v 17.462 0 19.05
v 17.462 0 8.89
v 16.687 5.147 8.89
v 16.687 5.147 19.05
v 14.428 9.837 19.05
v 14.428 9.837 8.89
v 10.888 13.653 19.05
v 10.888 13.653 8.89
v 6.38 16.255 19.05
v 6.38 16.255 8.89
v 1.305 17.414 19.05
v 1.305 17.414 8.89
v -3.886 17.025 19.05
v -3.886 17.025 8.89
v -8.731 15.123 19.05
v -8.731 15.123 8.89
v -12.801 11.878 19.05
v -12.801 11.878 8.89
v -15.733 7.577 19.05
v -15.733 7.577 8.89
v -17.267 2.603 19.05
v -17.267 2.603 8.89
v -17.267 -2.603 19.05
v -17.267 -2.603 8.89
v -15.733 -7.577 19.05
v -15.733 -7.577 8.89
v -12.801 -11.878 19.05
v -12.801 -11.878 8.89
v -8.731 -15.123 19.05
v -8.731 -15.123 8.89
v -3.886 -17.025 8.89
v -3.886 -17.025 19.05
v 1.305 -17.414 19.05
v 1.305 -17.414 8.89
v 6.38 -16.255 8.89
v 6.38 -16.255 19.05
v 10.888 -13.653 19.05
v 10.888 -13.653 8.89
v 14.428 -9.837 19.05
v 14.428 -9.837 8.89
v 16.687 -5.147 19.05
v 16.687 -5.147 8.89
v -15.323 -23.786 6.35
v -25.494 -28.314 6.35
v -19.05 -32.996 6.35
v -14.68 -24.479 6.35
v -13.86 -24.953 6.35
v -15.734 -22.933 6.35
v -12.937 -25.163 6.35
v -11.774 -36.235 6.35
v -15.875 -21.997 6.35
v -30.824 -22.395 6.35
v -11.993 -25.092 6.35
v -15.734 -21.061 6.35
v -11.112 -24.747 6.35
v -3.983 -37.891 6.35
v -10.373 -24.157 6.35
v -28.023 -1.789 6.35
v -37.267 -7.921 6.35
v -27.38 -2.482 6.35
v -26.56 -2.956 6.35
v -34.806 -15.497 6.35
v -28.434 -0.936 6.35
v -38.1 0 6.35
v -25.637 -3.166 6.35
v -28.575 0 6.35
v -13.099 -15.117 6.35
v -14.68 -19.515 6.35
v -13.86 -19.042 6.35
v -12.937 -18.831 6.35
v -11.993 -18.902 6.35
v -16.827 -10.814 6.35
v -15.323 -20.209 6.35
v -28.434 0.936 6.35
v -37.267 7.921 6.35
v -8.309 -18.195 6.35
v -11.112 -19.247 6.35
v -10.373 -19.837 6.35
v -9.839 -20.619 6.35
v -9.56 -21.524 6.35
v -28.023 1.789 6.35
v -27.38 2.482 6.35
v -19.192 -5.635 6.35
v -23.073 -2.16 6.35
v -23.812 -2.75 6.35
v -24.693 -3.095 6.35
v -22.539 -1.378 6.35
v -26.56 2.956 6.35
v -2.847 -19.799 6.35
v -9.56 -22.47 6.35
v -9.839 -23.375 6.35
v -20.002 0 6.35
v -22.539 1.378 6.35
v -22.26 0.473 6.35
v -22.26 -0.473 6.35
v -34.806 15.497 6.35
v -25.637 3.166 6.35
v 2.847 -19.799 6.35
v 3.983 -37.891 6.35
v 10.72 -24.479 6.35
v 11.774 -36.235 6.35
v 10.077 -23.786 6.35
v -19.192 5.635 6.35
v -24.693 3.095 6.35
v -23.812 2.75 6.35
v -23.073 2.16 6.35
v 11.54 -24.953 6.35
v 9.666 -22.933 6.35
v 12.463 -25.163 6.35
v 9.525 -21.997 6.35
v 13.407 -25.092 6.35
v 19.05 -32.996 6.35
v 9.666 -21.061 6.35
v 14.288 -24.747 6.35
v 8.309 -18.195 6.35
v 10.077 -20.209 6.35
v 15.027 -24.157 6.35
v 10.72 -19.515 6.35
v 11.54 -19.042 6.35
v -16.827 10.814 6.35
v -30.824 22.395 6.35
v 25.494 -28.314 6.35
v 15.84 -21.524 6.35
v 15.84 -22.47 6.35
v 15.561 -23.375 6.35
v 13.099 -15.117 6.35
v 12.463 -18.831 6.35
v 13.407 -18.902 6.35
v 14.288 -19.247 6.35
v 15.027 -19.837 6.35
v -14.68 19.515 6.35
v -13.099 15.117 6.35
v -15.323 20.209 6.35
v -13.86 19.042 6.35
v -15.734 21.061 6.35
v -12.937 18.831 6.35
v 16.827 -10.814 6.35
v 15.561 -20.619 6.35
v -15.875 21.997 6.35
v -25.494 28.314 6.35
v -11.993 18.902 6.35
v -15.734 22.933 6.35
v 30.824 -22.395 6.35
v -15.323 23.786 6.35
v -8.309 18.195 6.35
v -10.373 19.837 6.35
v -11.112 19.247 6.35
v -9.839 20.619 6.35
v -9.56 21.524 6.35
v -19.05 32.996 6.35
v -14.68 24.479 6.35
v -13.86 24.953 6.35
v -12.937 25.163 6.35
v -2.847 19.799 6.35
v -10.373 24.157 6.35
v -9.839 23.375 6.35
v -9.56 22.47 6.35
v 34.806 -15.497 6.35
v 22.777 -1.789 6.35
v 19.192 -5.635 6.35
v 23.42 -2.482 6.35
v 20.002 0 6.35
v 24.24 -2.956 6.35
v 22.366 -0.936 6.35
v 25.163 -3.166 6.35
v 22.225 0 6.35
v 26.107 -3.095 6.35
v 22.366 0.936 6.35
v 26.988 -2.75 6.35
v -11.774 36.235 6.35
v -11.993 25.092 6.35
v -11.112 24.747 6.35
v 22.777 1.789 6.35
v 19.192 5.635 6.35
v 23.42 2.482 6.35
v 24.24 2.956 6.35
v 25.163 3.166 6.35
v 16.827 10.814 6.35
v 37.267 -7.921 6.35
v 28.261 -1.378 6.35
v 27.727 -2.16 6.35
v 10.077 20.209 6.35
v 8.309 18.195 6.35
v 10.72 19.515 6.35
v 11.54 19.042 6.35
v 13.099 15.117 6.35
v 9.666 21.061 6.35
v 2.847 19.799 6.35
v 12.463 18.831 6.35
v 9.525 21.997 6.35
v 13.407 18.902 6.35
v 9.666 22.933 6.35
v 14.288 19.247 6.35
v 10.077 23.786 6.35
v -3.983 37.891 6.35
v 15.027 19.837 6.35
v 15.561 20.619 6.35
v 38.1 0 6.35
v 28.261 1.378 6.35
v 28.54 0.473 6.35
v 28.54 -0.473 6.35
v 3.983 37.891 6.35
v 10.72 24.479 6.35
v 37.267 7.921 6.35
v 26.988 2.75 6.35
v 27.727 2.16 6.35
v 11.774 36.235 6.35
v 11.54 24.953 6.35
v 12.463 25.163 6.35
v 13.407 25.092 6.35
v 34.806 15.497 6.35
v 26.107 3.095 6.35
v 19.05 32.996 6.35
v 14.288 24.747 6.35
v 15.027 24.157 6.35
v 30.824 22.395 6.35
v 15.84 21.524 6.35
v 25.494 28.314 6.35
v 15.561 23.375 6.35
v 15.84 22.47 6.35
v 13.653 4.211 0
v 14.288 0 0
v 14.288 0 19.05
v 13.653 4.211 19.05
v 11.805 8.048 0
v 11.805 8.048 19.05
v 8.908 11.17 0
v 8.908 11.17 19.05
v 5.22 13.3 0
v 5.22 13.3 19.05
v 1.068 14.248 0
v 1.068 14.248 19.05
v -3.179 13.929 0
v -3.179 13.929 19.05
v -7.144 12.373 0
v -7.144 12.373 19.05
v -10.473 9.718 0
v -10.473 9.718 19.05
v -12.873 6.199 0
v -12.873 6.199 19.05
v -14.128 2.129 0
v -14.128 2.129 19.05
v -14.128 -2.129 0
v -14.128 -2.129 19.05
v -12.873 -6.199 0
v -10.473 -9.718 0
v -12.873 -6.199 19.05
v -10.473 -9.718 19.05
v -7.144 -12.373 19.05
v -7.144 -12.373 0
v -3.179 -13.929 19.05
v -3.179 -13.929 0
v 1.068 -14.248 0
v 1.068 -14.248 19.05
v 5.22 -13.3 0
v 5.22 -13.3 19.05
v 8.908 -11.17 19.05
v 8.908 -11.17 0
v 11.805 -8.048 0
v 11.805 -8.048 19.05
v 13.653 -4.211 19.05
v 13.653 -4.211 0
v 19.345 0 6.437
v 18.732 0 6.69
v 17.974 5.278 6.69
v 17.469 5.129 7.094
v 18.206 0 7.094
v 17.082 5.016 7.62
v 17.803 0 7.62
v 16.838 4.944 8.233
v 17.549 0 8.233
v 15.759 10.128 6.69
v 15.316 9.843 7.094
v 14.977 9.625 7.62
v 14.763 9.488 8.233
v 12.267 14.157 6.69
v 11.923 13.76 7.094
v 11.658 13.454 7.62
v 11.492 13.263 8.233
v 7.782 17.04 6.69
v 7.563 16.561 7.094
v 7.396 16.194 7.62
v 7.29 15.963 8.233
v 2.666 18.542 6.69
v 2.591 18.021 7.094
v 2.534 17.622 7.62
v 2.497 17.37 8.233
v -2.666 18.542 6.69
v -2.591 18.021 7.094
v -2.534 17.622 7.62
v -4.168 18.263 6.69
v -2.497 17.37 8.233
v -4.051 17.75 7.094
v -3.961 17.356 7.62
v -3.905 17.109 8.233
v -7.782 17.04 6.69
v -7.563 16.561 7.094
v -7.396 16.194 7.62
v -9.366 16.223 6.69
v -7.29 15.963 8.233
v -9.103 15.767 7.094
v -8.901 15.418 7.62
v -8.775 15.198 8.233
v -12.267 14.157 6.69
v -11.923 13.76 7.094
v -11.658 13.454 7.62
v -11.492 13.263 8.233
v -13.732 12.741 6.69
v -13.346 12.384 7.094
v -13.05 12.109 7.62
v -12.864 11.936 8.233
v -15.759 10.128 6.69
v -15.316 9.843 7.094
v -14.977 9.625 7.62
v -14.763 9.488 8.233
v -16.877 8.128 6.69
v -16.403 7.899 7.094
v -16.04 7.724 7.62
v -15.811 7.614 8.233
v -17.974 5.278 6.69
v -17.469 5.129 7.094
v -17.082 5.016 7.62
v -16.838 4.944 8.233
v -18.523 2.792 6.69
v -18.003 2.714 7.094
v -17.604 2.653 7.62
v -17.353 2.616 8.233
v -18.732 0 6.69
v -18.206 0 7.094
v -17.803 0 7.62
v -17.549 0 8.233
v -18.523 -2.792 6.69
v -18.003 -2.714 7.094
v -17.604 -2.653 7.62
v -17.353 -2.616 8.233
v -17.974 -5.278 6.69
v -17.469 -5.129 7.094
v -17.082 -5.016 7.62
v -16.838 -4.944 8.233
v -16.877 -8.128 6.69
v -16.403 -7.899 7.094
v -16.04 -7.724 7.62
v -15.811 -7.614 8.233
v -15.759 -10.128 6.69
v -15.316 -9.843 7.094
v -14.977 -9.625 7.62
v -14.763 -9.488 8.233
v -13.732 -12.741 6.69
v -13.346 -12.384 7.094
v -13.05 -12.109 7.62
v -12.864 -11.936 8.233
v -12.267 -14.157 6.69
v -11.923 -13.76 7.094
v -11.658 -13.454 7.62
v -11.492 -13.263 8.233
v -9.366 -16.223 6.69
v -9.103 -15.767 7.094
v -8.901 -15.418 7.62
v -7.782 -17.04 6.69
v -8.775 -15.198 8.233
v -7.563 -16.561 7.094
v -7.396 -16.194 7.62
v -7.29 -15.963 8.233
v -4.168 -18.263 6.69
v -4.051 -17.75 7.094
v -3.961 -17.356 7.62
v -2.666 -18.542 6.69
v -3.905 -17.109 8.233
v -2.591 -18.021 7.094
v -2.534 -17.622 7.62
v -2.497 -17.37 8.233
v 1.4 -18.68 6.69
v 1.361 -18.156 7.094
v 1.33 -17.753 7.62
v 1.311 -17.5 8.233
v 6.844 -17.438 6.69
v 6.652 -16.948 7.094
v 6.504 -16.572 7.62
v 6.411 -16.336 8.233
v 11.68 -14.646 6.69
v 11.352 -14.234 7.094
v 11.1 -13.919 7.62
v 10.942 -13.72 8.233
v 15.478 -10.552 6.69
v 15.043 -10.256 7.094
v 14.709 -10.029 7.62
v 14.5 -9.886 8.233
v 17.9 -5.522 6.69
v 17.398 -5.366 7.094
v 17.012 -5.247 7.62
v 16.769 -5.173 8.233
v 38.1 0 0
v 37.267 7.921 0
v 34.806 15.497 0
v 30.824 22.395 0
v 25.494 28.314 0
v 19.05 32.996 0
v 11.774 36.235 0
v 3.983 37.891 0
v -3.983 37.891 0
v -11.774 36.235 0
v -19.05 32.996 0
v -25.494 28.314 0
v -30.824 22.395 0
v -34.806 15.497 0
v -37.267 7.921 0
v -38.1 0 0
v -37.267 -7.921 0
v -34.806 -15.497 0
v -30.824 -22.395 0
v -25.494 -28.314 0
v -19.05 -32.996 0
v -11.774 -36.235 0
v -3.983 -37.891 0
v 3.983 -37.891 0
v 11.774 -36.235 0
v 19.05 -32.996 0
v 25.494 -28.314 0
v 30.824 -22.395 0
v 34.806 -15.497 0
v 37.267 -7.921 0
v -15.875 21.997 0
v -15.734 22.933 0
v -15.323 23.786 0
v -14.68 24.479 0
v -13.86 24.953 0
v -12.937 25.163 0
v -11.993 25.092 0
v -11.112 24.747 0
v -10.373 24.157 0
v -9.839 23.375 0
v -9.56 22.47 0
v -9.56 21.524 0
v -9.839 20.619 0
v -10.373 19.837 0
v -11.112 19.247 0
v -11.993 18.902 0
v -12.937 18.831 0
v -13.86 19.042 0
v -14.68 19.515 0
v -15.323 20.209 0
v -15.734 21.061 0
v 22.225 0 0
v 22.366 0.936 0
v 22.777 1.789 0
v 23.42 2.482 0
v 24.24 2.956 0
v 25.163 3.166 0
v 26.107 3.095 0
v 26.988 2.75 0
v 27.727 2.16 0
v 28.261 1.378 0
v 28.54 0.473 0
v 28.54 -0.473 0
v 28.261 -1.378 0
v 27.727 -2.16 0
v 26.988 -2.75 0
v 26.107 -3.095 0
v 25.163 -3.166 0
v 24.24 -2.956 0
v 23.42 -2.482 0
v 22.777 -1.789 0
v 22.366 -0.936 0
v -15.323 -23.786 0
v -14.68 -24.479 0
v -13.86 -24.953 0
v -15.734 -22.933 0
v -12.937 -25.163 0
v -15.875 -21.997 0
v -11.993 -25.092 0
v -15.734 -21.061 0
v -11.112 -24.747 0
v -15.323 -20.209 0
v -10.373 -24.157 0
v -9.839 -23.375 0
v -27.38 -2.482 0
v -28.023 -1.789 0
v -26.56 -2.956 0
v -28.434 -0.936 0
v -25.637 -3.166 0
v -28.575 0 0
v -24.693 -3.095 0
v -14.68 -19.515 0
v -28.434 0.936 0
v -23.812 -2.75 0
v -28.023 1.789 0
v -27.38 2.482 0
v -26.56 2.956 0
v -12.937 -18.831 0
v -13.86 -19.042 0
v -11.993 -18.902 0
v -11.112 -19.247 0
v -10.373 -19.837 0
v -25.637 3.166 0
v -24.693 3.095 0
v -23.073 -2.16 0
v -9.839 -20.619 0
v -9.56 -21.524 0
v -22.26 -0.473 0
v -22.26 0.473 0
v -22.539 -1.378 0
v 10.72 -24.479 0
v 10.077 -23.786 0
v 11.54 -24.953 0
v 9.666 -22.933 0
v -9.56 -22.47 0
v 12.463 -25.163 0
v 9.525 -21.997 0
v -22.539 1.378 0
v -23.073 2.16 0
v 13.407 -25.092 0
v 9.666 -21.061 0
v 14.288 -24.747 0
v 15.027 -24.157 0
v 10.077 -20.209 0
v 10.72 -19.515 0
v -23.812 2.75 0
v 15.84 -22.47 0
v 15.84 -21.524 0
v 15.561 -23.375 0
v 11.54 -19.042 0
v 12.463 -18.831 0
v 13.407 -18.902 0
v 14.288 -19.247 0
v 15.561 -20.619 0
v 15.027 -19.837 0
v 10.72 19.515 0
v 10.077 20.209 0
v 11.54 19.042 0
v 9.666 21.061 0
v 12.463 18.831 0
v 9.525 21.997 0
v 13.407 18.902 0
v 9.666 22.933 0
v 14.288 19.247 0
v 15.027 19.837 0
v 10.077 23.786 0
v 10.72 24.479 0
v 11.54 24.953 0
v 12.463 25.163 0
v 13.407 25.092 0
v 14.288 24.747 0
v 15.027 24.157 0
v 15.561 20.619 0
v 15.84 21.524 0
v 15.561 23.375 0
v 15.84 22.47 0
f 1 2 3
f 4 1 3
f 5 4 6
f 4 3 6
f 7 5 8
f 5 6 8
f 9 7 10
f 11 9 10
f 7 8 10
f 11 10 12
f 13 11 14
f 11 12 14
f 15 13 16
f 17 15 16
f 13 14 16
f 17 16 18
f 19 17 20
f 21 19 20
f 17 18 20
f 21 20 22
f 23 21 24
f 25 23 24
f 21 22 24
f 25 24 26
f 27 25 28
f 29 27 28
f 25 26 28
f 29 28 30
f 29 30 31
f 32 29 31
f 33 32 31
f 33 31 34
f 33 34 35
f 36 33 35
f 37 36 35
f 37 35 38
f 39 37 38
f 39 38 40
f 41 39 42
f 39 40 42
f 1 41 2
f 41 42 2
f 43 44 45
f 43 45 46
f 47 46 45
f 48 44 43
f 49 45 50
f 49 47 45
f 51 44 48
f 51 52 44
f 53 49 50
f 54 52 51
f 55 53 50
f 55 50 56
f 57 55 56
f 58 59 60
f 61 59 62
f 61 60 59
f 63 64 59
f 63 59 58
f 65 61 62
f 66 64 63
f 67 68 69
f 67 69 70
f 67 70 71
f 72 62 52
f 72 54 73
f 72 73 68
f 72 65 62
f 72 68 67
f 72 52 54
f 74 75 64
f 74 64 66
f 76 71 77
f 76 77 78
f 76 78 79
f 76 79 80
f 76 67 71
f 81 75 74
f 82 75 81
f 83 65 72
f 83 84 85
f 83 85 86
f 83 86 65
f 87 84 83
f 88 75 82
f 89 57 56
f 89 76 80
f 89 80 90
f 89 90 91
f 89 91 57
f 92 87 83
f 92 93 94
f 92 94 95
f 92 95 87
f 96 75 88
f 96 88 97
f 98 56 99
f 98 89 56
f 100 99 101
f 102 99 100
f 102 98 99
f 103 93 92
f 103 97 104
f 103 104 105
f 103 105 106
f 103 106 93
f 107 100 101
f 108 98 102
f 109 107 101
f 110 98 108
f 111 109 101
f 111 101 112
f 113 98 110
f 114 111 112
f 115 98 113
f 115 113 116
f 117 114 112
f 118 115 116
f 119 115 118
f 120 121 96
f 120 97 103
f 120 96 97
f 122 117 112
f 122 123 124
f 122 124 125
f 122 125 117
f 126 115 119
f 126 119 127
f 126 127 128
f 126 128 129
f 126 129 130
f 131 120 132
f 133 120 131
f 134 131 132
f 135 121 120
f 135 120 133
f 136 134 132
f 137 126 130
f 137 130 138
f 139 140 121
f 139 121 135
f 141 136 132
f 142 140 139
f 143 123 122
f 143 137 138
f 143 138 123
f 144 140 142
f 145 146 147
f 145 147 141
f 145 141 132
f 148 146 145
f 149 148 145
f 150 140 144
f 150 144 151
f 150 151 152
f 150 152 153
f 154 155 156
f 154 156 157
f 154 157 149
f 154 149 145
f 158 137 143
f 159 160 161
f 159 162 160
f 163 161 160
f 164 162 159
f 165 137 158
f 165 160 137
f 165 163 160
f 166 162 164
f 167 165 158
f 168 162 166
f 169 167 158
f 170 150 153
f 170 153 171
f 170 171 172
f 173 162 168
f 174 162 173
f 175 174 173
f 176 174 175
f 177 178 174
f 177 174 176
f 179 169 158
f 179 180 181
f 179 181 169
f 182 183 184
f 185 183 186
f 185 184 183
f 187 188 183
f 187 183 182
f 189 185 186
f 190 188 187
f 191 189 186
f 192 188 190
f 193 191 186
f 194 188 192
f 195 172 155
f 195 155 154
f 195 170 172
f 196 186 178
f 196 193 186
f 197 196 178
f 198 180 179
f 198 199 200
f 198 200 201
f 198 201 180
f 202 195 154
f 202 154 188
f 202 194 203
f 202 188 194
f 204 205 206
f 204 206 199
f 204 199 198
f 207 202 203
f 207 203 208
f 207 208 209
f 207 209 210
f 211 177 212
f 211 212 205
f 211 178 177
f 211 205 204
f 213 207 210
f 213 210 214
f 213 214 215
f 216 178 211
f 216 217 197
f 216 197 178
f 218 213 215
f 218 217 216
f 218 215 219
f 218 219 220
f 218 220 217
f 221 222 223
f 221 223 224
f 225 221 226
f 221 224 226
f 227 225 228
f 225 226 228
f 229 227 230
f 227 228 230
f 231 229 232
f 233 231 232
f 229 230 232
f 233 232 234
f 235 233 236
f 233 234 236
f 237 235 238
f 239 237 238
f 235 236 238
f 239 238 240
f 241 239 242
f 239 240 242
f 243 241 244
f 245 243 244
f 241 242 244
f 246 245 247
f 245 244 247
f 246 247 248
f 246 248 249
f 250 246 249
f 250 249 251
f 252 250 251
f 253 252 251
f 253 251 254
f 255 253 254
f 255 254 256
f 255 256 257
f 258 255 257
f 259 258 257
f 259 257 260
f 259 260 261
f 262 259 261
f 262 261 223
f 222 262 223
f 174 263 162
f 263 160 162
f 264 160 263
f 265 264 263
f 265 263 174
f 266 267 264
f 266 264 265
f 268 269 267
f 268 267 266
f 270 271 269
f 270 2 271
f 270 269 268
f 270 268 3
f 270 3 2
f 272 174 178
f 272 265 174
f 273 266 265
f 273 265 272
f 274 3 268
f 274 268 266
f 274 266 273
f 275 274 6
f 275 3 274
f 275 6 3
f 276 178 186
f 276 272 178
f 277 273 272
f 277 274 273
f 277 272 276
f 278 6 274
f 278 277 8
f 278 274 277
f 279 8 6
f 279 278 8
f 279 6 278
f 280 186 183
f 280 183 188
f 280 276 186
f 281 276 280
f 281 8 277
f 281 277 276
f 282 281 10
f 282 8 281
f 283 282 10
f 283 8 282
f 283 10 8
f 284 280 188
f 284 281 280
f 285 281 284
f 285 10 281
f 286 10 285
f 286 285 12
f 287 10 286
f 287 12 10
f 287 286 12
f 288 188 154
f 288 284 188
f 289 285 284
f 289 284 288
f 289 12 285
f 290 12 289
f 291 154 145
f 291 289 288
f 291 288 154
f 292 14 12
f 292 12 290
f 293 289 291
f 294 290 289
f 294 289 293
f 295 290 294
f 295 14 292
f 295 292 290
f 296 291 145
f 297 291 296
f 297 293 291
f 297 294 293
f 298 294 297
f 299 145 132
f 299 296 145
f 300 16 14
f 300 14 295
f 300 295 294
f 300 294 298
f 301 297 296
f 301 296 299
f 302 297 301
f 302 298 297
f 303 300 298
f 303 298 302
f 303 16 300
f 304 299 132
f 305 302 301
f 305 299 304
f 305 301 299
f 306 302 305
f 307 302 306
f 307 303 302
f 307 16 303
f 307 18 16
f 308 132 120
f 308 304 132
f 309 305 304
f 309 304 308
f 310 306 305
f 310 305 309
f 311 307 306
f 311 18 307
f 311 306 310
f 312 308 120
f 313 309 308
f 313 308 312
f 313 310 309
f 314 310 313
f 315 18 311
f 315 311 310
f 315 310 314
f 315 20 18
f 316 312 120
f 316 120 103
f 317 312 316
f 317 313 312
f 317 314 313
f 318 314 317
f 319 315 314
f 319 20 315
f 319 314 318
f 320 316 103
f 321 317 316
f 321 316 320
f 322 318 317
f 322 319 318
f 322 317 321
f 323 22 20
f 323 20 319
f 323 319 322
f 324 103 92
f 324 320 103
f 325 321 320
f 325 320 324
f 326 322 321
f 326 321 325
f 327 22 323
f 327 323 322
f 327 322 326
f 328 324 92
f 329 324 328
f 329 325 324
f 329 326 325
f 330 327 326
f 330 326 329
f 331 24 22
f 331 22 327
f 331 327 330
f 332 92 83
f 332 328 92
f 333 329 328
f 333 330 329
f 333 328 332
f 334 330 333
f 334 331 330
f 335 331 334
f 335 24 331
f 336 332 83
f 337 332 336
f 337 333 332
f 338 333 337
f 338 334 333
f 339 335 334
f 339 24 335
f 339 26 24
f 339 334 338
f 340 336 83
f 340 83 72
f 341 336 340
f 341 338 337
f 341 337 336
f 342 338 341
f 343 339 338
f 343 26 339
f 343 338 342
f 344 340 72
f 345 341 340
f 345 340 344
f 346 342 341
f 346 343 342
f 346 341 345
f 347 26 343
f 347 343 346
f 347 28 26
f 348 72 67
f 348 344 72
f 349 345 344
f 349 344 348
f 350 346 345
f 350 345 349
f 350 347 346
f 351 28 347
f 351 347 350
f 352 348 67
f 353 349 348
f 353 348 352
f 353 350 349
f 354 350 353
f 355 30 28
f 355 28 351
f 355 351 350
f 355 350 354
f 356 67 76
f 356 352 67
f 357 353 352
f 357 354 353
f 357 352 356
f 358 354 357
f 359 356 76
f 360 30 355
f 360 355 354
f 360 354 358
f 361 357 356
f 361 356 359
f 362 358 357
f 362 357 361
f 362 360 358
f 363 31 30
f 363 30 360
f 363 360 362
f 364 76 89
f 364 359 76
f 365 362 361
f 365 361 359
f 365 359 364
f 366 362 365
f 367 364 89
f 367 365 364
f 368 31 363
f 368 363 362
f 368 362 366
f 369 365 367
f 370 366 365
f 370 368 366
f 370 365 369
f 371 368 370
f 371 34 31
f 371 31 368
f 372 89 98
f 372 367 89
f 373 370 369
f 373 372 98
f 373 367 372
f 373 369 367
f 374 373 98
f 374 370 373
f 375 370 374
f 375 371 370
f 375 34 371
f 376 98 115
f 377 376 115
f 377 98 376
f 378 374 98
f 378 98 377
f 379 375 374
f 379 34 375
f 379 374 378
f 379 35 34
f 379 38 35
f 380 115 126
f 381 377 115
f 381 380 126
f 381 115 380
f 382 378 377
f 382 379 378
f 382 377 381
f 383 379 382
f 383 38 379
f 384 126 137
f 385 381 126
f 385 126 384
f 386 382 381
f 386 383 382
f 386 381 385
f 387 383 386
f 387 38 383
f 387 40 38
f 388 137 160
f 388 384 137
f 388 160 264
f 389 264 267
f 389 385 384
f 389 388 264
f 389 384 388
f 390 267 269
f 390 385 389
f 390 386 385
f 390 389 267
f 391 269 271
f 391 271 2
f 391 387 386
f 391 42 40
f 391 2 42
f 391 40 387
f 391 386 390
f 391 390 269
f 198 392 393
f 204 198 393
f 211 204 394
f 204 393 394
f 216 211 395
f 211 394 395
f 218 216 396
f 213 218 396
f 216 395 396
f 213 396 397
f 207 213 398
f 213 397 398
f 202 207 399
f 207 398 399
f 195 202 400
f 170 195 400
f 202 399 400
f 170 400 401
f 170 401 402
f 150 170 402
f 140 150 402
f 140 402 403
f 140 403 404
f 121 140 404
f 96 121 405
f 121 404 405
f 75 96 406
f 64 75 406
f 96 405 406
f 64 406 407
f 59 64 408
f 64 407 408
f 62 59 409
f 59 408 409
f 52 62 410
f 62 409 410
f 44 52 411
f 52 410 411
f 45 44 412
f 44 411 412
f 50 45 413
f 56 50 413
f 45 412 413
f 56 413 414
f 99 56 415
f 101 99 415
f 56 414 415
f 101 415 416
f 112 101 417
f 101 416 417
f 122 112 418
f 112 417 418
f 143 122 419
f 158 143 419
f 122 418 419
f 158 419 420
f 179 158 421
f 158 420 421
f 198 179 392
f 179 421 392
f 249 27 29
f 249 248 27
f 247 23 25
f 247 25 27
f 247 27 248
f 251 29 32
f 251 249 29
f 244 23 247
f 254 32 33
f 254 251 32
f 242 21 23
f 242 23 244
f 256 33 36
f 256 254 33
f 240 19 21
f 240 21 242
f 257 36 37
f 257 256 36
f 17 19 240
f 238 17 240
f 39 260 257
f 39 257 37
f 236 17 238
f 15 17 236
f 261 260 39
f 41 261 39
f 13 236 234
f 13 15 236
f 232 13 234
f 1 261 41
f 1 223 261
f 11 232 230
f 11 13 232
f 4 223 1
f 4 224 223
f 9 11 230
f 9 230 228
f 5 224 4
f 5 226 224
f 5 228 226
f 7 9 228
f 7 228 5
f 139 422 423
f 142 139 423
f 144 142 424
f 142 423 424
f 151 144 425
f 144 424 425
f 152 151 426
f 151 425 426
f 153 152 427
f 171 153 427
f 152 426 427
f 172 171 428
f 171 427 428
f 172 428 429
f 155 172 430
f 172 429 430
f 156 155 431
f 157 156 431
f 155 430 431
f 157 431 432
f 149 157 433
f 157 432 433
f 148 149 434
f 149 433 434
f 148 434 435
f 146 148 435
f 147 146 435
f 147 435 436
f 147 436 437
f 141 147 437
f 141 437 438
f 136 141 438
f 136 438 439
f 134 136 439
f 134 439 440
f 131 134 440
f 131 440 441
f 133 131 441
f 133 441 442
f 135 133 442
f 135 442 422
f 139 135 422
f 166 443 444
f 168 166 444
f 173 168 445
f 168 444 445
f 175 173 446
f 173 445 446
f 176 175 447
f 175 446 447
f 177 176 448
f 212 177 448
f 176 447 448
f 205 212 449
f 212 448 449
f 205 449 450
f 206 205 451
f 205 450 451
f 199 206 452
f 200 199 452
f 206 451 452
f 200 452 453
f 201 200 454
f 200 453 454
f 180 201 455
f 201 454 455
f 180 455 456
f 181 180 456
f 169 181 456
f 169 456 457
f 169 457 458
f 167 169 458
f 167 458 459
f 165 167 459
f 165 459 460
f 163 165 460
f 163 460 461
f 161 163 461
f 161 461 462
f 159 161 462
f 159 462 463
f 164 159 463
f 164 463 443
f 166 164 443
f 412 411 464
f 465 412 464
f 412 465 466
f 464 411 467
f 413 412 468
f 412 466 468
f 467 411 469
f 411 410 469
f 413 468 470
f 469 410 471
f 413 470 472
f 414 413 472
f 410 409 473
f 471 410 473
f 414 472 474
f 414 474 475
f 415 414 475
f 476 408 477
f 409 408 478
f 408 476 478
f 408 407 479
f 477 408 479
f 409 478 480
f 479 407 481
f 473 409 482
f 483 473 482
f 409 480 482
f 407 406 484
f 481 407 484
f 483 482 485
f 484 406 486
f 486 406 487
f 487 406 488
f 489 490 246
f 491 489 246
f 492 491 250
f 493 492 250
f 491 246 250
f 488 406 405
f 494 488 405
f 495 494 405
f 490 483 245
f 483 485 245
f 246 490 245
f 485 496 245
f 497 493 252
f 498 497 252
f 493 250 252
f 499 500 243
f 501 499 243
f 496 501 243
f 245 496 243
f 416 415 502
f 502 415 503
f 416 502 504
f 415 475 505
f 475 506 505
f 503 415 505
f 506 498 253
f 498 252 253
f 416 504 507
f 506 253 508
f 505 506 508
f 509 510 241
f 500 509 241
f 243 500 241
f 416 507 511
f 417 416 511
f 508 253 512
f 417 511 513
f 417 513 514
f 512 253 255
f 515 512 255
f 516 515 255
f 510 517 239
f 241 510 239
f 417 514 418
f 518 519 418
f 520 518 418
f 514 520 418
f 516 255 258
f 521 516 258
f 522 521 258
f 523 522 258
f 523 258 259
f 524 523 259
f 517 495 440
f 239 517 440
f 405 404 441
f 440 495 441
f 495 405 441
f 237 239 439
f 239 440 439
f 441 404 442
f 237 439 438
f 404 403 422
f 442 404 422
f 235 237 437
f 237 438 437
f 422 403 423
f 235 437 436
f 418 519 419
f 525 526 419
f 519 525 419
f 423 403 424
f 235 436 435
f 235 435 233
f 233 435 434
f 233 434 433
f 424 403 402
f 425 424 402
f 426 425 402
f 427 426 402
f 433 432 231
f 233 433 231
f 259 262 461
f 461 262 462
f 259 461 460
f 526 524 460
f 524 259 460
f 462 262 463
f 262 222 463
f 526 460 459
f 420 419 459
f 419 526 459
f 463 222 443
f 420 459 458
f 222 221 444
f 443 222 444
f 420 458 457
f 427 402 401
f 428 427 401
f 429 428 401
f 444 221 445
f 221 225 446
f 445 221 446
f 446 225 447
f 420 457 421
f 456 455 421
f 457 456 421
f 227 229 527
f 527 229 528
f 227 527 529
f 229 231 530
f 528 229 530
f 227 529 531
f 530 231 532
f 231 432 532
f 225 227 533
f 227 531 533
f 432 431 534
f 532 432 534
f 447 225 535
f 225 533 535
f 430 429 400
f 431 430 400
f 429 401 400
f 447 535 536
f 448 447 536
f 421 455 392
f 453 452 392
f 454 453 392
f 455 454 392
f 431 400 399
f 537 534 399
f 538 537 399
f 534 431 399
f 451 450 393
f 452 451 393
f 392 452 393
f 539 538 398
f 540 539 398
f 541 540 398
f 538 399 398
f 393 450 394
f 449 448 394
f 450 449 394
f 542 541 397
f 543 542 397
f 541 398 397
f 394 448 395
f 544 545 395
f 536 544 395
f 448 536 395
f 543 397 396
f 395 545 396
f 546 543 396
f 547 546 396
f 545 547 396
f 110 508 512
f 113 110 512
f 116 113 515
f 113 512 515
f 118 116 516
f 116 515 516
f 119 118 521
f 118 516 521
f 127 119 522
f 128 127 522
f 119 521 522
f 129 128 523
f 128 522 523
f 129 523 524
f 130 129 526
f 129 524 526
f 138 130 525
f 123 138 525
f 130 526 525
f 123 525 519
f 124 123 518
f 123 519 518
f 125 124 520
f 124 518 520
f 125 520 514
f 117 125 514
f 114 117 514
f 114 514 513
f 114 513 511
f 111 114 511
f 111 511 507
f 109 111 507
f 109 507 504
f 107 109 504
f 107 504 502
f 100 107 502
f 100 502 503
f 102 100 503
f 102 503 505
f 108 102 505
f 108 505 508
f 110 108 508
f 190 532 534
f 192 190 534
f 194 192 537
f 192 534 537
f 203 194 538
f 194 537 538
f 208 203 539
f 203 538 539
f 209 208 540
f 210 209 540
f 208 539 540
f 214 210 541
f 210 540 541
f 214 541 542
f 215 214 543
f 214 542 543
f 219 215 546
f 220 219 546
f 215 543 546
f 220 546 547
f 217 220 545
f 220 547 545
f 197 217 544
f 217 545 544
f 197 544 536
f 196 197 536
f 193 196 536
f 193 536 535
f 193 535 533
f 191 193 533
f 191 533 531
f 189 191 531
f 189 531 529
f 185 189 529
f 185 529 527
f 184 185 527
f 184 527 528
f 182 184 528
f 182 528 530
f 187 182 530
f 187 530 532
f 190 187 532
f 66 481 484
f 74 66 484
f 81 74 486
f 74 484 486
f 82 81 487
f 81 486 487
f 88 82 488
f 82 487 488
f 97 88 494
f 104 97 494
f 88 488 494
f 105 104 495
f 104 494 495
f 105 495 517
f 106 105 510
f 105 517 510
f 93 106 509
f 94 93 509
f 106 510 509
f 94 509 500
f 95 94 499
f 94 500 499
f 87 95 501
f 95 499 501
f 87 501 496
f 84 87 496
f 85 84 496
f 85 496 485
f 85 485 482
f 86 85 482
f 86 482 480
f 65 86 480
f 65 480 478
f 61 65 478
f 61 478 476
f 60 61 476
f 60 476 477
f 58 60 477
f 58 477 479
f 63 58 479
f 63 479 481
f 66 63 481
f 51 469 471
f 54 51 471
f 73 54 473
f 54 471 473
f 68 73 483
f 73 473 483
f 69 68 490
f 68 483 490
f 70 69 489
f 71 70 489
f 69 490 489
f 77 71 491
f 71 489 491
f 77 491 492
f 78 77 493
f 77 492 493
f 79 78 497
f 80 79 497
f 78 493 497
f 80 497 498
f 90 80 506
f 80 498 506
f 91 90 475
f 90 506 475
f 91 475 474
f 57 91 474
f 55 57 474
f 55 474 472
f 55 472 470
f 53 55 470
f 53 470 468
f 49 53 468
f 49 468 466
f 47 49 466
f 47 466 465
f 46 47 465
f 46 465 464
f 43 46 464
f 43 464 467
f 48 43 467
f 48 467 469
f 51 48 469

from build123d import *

# Parameters (mm, degrees)
SKETCH1_R           = 38.1
BOSS_EXTRUDE1_DEPTH = 6.35
SKETCH2_R           = 17.4625
BOSS_EXTRUDE2_DEPTH = 12.7
FILLET2_R           = 2.54
CUT_EXTRUDE1_REACH  = 59.15
SKETCH3_R           = 14.2875
SKETCH4_R           = 3.175
CUT_EXTRUDE2_DEPTH  = 58.15


with BuildPart() as part:
    # Sketch1 → Boss-Extrude1 (new body)
    with BuildSketch(Plane.XY):
        Circle(SKETCH1_R)
    extrude(amount=BOSS_EXTRUDE1_DEPTH)

    # Sketch2 → Boss-Extrude2 (add)
    with BuildSketch(Plane.XY.offset(6.35)):
        Circle(SKETCH2_R)
    extrude(amount=BOSS_EXTRUDE2_DEPTH)

    # Fillet2
    fillet2_edges = [part.edges().sort_by_distance(p)[0] for p in [
        (-17.4625, 0, 6.35),
    ]]
    fillet(fillet2_edges, radius=FILLET2_R)

    # Sketch3 → Cut-Extrude1 (cut, up to next)
    with BuildSketch(Plane.XY.offset(19.05), mode=Mode.PRIVATE) as cut_extrude1_sk1:
        Circle(SKETCH3_R)
    cut_extrude1_tool1 = extrude(cut_extrude1_sk1.sketch, amount=-CUT_EXTRUDE1_REACH, mode=Mode.PRIVATE) & part.part
    add(cut_extrude1_tool1.solids().sort_by_distance((0, 0, 19.05))[0], mode=Mode.SUBTRACT)

    # Sketch4 → Cut-Extrude2 (cut, through all)
    with BuildSketch(Plane(origin=(0, 0, 0), x_dir=(-1, 0, 0), z_dir=(0, 0, -1))):
        with Locations((-25.4, 0)):
            Circle(SKETCH4_R)
        with Locations((-12.7, 21.997045256)):
            Circle(SKETCH4_R)
        with Locations((12.7, 21.997045256)):
            Circle(SKETCH4_R)
        with Locations((25.4, 0)):
            Circle(SKETCH4_R)
        with Locations((12.7, -21.997045256)):
            Circle(SKETCH4_R)
        with Locations((-12.7, -21.997045256)):
            Circle(SKETCH4_R)
    extrude(amount=-CUT_EXTRUDE2_DEPTH, mode=Mode.SUBTRACT)


solid = part.part
